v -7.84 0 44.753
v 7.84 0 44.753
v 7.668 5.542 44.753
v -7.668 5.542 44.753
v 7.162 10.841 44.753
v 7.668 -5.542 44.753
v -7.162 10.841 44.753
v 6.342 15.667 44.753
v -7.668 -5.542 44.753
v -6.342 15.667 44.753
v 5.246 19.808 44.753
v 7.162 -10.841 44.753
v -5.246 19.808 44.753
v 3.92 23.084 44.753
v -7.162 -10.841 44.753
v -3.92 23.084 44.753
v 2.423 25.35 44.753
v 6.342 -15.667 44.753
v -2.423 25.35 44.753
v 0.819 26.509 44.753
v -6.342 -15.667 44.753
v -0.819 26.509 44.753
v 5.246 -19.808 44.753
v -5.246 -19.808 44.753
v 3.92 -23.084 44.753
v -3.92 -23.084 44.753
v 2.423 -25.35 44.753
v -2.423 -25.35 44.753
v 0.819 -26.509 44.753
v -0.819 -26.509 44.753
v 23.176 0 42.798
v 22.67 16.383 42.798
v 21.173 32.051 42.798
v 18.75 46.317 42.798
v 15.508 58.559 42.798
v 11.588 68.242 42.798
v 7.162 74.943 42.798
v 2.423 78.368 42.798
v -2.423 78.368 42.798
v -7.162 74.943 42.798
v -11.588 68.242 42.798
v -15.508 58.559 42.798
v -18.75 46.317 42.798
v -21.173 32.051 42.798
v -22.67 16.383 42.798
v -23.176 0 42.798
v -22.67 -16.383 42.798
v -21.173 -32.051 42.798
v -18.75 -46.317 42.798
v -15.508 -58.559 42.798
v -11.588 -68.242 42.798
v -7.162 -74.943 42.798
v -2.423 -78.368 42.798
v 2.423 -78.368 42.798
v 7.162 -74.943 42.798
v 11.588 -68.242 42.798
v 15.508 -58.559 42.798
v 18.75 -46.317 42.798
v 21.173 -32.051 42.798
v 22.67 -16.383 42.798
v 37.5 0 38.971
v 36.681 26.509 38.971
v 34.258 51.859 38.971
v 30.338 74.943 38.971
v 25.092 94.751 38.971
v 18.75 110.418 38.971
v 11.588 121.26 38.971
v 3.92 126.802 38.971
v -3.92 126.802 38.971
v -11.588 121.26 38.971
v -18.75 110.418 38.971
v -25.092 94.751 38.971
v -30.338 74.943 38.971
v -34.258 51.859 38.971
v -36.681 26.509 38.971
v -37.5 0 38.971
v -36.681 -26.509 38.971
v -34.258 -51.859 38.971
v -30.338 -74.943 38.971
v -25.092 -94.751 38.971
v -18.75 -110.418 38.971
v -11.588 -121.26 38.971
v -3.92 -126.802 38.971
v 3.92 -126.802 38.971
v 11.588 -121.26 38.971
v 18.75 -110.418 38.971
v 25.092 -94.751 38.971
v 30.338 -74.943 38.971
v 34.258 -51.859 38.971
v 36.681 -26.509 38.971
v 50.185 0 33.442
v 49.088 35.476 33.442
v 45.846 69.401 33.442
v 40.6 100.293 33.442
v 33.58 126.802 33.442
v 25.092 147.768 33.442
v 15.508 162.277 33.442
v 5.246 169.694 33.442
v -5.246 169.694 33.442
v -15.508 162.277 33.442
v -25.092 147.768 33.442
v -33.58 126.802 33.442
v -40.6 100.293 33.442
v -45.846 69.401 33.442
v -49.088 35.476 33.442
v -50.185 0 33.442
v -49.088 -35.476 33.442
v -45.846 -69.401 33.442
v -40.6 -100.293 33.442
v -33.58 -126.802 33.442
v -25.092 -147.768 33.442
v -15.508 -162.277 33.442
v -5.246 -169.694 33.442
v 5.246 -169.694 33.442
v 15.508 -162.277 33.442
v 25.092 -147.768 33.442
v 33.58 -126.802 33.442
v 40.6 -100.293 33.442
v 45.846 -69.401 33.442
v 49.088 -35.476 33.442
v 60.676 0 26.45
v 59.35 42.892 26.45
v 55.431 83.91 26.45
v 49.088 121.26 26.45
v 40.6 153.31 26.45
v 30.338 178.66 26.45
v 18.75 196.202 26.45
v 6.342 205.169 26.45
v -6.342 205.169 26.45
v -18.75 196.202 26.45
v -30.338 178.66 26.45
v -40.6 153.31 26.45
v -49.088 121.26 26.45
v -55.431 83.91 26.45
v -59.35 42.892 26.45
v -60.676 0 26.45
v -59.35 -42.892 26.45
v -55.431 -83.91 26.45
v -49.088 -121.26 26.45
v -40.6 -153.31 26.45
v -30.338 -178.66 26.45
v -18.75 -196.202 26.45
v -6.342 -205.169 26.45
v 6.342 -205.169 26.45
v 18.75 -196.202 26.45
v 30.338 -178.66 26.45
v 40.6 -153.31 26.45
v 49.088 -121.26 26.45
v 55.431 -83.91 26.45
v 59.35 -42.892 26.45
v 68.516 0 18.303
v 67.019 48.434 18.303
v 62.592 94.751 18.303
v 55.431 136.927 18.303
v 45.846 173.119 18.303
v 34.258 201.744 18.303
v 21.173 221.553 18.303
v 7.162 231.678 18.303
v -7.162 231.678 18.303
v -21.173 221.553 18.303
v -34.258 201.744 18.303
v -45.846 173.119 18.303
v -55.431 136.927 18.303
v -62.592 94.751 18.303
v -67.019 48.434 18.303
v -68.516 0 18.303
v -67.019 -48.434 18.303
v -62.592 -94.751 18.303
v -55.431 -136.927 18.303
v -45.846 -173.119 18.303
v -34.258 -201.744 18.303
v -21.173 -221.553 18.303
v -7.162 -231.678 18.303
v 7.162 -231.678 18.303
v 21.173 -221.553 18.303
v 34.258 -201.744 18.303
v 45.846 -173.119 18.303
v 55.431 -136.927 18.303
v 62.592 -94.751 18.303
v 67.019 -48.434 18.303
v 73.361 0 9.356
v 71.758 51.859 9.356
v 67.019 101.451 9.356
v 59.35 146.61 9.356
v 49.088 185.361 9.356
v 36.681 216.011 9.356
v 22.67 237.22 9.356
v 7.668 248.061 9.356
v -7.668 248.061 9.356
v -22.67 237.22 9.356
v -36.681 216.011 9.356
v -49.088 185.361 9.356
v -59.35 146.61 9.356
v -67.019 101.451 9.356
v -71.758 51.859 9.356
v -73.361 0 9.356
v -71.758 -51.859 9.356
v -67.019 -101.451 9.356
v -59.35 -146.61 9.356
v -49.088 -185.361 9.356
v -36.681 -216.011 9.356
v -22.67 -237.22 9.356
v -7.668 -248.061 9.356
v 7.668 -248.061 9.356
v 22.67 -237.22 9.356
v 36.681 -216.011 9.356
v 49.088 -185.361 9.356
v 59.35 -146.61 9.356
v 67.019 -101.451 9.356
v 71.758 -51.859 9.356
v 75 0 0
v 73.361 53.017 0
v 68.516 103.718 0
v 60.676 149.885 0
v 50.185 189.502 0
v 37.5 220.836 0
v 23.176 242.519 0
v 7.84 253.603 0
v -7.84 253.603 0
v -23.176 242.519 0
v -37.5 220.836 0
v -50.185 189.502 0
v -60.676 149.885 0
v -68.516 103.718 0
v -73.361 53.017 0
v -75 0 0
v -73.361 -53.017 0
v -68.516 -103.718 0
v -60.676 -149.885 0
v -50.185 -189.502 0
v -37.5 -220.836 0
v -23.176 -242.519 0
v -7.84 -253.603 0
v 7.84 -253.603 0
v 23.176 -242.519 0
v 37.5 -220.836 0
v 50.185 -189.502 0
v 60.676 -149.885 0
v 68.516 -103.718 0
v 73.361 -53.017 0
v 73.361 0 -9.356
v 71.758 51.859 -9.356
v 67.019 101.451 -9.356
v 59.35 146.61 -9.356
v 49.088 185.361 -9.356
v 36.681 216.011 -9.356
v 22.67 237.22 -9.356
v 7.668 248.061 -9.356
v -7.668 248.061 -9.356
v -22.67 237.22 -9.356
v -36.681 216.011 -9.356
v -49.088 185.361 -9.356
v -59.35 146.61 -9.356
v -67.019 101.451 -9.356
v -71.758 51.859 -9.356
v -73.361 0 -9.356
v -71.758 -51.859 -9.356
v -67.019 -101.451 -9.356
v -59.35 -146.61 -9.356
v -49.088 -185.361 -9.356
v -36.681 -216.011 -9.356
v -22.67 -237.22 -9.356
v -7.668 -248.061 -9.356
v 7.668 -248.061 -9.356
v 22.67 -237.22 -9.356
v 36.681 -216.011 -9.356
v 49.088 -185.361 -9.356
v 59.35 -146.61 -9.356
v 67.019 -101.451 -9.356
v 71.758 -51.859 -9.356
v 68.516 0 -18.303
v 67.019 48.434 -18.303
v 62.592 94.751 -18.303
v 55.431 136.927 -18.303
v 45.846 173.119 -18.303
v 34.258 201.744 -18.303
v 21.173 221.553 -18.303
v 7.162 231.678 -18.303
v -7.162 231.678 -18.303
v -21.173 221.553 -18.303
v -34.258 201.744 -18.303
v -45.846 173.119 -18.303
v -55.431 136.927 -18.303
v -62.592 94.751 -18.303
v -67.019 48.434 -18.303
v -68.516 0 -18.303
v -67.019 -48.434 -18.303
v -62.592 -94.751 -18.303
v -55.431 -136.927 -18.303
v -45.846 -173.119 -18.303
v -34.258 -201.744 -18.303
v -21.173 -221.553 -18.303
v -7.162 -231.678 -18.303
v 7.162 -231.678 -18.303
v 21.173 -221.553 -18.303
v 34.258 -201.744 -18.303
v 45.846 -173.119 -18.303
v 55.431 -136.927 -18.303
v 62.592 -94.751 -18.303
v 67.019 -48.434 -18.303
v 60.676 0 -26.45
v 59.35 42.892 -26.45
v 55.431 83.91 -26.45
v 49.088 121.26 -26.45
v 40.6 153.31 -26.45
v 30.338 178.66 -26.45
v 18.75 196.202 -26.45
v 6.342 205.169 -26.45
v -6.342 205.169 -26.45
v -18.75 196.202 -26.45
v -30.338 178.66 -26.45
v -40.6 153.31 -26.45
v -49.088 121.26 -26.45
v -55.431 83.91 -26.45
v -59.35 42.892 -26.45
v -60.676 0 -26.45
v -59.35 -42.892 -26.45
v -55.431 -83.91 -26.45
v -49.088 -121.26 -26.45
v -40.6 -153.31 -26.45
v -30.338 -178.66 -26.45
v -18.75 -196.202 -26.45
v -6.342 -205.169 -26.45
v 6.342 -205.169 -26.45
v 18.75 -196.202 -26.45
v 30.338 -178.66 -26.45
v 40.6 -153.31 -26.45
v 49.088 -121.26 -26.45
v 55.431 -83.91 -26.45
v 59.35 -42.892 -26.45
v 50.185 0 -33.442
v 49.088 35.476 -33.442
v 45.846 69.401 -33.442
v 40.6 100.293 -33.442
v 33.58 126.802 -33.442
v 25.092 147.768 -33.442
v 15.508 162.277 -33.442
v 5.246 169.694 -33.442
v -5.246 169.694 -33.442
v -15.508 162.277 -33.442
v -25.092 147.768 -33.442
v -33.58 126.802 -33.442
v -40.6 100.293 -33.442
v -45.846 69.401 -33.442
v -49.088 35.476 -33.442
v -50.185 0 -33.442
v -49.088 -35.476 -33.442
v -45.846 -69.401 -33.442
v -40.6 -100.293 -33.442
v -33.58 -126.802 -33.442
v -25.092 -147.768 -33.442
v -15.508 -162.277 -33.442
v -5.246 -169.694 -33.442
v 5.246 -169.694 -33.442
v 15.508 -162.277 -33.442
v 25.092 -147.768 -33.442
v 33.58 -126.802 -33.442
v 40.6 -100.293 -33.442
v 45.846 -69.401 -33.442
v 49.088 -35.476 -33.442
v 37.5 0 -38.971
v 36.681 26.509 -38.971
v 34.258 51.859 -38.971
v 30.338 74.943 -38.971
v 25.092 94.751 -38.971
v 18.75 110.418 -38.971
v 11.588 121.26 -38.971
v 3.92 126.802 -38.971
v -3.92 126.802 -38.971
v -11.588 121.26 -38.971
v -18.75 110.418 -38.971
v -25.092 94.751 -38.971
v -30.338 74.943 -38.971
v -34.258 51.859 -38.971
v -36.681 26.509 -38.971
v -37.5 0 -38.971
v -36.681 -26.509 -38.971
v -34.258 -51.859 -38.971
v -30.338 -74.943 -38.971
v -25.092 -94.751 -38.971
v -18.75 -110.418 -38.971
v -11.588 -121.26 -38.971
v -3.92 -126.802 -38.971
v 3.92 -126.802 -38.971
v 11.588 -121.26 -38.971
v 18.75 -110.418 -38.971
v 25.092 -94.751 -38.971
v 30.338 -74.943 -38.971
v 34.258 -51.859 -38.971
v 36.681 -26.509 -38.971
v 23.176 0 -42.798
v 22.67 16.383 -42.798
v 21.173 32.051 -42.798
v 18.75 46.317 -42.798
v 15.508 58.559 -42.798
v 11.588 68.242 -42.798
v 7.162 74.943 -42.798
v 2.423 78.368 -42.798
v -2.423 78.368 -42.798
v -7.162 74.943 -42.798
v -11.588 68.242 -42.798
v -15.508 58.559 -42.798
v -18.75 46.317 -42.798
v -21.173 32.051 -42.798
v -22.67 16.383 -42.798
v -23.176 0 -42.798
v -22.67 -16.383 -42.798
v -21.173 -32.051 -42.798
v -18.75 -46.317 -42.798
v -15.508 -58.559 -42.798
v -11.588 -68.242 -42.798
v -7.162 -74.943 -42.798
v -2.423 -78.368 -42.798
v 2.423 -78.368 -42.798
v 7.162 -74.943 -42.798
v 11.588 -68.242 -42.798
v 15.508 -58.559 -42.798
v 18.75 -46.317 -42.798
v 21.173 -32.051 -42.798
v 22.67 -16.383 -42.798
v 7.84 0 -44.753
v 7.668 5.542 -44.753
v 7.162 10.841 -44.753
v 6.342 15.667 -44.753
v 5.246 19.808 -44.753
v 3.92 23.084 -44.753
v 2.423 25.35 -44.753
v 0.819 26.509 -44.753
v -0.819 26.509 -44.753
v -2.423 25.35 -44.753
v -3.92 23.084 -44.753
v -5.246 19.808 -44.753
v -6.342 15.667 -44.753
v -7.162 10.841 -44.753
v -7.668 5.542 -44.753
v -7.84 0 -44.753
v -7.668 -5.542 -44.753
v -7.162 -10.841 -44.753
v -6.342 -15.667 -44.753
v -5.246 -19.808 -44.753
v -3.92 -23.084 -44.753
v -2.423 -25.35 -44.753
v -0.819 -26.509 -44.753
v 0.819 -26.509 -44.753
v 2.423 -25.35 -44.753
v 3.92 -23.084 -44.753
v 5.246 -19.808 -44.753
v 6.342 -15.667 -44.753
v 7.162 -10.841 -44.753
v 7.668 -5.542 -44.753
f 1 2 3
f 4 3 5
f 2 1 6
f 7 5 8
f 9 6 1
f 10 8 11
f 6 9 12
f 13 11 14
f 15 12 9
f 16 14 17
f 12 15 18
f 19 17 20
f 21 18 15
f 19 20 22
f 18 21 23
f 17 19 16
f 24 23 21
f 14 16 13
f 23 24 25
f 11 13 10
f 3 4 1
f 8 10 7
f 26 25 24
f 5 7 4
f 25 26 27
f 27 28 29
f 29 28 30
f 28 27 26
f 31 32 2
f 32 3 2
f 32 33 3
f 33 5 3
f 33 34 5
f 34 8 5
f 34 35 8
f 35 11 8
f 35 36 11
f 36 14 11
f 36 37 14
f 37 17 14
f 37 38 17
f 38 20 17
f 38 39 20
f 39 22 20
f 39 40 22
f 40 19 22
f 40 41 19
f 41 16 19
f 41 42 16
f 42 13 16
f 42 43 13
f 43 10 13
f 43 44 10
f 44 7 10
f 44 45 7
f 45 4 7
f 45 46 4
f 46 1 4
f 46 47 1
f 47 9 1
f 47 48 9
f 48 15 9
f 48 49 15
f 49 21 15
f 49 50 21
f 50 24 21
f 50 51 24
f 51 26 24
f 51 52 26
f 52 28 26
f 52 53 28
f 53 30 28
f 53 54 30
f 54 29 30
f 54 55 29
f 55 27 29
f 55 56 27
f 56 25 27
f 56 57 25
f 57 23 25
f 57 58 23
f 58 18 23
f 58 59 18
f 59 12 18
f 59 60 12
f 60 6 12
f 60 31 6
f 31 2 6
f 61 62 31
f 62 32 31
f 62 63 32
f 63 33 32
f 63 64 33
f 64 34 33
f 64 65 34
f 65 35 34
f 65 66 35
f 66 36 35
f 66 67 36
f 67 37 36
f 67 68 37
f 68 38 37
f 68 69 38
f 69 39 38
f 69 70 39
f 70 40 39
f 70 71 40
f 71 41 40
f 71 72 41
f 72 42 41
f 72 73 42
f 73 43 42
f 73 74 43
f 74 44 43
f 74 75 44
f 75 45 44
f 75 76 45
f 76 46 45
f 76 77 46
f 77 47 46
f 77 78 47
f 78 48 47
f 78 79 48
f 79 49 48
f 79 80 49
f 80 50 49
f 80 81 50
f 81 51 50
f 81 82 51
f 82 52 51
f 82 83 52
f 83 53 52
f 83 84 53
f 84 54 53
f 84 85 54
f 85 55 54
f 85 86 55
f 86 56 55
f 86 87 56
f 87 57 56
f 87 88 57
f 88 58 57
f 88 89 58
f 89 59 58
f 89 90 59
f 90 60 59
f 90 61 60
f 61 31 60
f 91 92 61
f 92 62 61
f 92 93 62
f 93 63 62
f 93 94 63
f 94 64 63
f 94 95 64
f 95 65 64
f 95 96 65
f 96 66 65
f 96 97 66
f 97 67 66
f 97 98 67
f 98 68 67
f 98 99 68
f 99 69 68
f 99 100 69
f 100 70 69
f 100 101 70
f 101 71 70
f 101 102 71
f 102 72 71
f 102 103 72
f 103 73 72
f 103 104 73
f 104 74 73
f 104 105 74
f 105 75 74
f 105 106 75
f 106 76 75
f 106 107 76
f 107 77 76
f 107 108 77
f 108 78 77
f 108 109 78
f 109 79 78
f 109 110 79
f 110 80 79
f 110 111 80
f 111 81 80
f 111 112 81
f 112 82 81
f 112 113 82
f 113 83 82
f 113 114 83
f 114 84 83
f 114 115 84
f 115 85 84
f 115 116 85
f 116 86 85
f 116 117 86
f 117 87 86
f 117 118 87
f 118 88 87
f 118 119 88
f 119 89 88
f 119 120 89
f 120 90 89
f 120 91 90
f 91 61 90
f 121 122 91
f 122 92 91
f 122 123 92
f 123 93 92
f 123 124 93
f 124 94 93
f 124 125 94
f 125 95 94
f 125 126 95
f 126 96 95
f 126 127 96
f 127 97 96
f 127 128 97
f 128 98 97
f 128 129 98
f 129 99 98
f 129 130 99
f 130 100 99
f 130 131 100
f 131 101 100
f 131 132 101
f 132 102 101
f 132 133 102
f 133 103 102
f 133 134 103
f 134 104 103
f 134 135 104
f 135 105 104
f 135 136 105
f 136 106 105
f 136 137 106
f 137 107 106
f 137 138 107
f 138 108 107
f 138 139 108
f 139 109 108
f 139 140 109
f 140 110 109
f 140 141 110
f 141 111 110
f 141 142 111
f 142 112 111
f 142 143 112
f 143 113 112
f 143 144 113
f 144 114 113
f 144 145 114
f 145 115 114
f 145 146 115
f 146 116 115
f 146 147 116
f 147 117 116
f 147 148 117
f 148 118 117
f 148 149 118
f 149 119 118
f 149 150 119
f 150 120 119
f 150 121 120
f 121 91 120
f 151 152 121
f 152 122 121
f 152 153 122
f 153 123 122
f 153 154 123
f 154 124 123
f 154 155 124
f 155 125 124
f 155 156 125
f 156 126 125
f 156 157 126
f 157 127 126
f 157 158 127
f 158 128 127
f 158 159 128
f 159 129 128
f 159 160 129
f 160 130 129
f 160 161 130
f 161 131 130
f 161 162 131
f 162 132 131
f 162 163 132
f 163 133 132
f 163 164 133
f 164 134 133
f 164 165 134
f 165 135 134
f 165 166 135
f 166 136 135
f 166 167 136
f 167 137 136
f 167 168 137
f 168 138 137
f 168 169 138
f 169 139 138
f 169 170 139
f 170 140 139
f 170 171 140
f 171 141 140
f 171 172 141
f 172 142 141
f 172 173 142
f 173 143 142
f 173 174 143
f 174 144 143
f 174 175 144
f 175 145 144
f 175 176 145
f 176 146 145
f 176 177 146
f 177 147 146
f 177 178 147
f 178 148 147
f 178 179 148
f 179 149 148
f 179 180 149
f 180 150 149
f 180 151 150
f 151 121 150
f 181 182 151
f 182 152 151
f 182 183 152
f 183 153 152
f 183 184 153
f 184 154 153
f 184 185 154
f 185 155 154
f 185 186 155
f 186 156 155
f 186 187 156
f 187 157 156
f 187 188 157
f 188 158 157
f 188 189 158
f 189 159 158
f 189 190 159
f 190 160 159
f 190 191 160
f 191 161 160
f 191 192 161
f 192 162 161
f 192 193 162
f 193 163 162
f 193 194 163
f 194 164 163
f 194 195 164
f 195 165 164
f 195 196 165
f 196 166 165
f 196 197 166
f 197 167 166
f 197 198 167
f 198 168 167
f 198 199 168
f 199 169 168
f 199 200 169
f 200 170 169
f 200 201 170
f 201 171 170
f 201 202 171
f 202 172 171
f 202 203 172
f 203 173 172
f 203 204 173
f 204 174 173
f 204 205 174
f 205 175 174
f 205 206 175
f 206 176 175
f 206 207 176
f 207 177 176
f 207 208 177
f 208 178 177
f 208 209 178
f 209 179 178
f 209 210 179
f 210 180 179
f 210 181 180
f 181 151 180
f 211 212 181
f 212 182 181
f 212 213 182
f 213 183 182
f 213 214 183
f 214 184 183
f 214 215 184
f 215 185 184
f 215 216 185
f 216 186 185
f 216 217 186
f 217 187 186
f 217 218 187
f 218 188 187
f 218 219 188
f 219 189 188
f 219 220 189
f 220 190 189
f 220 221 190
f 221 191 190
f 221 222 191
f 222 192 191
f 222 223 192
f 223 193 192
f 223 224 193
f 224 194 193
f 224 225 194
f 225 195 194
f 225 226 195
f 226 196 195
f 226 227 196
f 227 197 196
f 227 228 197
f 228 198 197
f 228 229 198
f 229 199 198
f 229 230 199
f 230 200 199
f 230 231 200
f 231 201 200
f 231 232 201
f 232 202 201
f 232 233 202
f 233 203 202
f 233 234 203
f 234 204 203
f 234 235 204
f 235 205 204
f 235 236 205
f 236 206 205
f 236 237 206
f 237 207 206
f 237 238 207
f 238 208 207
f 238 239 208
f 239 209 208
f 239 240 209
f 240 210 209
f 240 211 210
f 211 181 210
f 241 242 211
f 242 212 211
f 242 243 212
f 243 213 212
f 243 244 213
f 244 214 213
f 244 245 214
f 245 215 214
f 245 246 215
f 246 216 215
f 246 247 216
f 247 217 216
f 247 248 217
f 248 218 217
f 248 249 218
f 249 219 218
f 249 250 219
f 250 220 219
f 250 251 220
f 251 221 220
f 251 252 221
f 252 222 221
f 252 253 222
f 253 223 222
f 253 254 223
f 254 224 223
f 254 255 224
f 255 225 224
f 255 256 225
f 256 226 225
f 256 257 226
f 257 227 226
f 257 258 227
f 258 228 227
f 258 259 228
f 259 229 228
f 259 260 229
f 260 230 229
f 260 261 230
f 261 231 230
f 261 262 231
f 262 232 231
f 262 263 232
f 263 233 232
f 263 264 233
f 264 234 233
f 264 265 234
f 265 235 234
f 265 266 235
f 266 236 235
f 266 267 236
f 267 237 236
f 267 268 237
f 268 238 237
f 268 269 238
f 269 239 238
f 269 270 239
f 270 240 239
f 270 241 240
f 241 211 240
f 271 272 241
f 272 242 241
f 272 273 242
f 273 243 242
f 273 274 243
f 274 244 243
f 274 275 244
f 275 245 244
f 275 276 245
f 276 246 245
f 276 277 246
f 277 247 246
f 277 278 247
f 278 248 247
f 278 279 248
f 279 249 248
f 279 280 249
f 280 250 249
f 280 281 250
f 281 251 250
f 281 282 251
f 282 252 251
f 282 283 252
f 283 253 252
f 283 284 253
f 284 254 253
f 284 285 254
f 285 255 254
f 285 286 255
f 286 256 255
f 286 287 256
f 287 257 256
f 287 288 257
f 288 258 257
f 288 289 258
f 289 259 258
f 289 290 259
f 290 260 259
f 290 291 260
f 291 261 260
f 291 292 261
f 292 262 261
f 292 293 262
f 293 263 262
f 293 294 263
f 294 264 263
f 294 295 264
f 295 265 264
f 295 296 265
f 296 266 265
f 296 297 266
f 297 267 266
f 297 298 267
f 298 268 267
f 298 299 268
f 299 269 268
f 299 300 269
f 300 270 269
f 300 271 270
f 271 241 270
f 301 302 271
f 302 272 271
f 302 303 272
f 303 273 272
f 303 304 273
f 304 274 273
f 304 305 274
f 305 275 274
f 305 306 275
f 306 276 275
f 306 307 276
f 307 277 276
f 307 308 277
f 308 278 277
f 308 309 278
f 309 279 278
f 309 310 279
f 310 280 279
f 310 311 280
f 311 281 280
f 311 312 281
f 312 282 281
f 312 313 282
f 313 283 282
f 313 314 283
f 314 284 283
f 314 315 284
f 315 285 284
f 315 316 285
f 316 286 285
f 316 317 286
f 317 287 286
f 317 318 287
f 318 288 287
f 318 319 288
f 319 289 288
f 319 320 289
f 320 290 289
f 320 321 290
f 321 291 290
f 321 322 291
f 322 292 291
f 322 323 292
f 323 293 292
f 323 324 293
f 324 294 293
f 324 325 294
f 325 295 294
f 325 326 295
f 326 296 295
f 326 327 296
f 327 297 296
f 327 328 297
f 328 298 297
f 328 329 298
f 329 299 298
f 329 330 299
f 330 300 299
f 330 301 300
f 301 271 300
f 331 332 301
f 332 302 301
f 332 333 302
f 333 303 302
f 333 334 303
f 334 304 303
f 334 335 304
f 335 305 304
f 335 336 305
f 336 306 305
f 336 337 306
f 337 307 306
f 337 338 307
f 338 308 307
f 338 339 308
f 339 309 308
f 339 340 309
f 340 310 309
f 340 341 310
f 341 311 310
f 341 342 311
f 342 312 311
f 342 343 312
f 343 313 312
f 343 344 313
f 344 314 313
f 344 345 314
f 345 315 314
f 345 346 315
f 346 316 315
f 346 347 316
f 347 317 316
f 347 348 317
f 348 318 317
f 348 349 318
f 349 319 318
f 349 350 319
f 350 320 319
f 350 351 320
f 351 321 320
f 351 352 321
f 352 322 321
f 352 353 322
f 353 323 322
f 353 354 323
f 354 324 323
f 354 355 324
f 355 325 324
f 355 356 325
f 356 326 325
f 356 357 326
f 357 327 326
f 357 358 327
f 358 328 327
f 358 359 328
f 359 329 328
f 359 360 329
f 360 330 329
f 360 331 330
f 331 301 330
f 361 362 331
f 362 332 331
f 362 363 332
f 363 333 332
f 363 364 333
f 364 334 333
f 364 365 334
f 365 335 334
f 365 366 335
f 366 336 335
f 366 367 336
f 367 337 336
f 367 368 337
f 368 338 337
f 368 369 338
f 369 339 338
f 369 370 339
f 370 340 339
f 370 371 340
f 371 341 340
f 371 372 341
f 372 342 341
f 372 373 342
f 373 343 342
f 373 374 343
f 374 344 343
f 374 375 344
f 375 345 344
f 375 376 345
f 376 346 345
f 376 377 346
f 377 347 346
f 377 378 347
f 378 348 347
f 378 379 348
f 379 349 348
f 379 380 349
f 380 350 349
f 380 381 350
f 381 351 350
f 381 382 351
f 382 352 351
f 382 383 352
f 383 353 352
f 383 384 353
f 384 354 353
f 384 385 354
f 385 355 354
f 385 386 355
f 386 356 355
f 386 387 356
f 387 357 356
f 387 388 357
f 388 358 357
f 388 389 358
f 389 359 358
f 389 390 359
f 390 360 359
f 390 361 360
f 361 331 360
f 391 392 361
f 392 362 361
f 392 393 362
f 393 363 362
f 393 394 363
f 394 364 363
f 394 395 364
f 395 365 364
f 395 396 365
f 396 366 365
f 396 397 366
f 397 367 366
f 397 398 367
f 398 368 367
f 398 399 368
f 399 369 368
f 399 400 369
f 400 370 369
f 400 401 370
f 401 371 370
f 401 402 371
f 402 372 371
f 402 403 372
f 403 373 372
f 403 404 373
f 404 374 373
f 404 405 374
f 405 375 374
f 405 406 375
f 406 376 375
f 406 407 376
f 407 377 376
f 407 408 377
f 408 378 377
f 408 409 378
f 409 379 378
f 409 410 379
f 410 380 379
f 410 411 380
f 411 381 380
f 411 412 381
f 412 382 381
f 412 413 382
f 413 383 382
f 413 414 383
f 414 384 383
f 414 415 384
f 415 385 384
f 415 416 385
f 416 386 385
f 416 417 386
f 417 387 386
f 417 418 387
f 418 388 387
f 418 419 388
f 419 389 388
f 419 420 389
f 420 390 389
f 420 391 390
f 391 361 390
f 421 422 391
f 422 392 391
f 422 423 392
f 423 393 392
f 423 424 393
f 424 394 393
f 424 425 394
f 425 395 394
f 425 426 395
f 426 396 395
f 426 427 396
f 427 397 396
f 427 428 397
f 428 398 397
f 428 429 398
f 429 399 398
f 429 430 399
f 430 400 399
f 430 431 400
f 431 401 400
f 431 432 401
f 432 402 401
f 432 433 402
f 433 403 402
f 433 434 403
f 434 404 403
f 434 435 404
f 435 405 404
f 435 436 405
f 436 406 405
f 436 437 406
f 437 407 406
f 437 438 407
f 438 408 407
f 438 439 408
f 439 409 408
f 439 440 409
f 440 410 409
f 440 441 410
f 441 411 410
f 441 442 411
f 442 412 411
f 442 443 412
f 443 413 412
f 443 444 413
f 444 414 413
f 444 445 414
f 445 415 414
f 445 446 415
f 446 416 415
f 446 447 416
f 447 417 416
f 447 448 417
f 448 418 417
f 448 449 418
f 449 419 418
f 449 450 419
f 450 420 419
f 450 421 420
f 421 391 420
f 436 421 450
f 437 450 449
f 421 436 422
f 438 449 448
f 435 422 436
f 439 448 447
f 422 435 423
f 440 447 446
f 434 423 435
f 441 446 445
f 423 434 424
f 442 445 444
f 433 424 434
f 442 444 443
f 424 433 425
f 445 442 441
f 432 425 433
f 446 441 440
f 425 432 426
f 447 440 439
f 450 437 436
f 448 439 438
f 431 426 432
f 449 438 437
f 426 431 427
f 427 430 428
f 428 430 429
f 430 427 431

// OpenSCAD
// Generated by SolidPython 1.0.1 on 2020-07-29 00:46:46


scale(v = [5, 17, 3]) {
	sphere(r = 15);
}
/***********************************************
*********      SolidPython code:      **********
************************************************
 
# import packages: SolidPython
from solid import *
from solid.utils import *
from itertools import chain, combinations, permutations


class Resize:

    def __init__(self, scad_file):
        self.scad_file = scad_file
        #self.scad_file = import_scad(scad_file)
        # cone/cylinder param:
        self.r1 = 0
        self.r2 = 0
        self.h = 0
        # rectangular prism param:
        self.w = 0
        self.l = 0
        # ellipse param:
        self.r = 0

    # import OpenScad code (file name corresponds to shape)


    # classify shape + parameters
    def assign(self, param1, param2, param3):
        if self.scad_file == 'cone.scad':
            self.r1 = param1
            self.r2 = param2
            self.h = param3
        elif self.scad_file == 'cylinder.scad':
            self.r1 = param1
            self.r2 = param2
            self.h = param3
        elif self.scad_file == 'rectangularPrism.scad':
            self.h = param1
            self.l = param2
            self.w = param3
        else:
            self.r = param1
            self.h = param2

    # resize parameters
    def iterate(self):
        x = range(3, 20, 2)
        i = 1
        if self.scad_file == 'cone.scad':
            tempList = list(permutations(x, 2))
            for temp in tempList:
                param1 = temp[0]
                param2 = temp[1]
                filepath = 'produced_scad_files/' + 'cone' + str(param1) + '_' + str(param2) + '_' + '.scad'
                scad_render_to_file(cylinder(h=param1, r1=param2, r2=0), filepath)

        elif self.scad_file == 'cylinder.scad':
            tempList = list(permutations(x, 3))
            for temp in tempList:
                param1 = temp[0]
                param2 = temp[1]
                filepath = 'produced_scad_files/' + 'cylinder' + str(param1) + '_' + str(param2) + '_' + '.scad'
                scad_render_to_file(cylinder(h=param1, r1=param2, r2=param2), filepath)

        elif self.scad_file == 'rectangularPrism.scad':
            tempList = list(permutations(x, 3))
            for temp in tempList:
                param1 = temp[0]
                param2 = temp[1]
                param3 = temp[2]
                filepath = 'produced_scad_files/' + 'rectangularPrism' + str(param1) + '_' + str(param2) + '_' + str(
                    param3) + '.scad'
                scad_render_to_file(cube(size=(param1, param2, param3)), filepath)

        elif self.scad_file == 'ellipse.scad':
            tempList = list(permutations(x, 4))
            for temp in tempList:
                param1 = temp[0]
                param2 = temp[1]
                param3 = temp[2]
                param4 = temp[3]
                filepath = 'produced_scad_files/' + 'ellipse' + str(param1) + '_' + str(param2) + '_' + str(param3) + '_' + str(param4) + '.scad'
                scad_render_to_file(scale([param1, param2, param3])(sphere(r=param4)), filepath)

    def render_to_scadfile(self):
        scad_render_to_file(scad, 'example.scad') 
 
************************************************/
